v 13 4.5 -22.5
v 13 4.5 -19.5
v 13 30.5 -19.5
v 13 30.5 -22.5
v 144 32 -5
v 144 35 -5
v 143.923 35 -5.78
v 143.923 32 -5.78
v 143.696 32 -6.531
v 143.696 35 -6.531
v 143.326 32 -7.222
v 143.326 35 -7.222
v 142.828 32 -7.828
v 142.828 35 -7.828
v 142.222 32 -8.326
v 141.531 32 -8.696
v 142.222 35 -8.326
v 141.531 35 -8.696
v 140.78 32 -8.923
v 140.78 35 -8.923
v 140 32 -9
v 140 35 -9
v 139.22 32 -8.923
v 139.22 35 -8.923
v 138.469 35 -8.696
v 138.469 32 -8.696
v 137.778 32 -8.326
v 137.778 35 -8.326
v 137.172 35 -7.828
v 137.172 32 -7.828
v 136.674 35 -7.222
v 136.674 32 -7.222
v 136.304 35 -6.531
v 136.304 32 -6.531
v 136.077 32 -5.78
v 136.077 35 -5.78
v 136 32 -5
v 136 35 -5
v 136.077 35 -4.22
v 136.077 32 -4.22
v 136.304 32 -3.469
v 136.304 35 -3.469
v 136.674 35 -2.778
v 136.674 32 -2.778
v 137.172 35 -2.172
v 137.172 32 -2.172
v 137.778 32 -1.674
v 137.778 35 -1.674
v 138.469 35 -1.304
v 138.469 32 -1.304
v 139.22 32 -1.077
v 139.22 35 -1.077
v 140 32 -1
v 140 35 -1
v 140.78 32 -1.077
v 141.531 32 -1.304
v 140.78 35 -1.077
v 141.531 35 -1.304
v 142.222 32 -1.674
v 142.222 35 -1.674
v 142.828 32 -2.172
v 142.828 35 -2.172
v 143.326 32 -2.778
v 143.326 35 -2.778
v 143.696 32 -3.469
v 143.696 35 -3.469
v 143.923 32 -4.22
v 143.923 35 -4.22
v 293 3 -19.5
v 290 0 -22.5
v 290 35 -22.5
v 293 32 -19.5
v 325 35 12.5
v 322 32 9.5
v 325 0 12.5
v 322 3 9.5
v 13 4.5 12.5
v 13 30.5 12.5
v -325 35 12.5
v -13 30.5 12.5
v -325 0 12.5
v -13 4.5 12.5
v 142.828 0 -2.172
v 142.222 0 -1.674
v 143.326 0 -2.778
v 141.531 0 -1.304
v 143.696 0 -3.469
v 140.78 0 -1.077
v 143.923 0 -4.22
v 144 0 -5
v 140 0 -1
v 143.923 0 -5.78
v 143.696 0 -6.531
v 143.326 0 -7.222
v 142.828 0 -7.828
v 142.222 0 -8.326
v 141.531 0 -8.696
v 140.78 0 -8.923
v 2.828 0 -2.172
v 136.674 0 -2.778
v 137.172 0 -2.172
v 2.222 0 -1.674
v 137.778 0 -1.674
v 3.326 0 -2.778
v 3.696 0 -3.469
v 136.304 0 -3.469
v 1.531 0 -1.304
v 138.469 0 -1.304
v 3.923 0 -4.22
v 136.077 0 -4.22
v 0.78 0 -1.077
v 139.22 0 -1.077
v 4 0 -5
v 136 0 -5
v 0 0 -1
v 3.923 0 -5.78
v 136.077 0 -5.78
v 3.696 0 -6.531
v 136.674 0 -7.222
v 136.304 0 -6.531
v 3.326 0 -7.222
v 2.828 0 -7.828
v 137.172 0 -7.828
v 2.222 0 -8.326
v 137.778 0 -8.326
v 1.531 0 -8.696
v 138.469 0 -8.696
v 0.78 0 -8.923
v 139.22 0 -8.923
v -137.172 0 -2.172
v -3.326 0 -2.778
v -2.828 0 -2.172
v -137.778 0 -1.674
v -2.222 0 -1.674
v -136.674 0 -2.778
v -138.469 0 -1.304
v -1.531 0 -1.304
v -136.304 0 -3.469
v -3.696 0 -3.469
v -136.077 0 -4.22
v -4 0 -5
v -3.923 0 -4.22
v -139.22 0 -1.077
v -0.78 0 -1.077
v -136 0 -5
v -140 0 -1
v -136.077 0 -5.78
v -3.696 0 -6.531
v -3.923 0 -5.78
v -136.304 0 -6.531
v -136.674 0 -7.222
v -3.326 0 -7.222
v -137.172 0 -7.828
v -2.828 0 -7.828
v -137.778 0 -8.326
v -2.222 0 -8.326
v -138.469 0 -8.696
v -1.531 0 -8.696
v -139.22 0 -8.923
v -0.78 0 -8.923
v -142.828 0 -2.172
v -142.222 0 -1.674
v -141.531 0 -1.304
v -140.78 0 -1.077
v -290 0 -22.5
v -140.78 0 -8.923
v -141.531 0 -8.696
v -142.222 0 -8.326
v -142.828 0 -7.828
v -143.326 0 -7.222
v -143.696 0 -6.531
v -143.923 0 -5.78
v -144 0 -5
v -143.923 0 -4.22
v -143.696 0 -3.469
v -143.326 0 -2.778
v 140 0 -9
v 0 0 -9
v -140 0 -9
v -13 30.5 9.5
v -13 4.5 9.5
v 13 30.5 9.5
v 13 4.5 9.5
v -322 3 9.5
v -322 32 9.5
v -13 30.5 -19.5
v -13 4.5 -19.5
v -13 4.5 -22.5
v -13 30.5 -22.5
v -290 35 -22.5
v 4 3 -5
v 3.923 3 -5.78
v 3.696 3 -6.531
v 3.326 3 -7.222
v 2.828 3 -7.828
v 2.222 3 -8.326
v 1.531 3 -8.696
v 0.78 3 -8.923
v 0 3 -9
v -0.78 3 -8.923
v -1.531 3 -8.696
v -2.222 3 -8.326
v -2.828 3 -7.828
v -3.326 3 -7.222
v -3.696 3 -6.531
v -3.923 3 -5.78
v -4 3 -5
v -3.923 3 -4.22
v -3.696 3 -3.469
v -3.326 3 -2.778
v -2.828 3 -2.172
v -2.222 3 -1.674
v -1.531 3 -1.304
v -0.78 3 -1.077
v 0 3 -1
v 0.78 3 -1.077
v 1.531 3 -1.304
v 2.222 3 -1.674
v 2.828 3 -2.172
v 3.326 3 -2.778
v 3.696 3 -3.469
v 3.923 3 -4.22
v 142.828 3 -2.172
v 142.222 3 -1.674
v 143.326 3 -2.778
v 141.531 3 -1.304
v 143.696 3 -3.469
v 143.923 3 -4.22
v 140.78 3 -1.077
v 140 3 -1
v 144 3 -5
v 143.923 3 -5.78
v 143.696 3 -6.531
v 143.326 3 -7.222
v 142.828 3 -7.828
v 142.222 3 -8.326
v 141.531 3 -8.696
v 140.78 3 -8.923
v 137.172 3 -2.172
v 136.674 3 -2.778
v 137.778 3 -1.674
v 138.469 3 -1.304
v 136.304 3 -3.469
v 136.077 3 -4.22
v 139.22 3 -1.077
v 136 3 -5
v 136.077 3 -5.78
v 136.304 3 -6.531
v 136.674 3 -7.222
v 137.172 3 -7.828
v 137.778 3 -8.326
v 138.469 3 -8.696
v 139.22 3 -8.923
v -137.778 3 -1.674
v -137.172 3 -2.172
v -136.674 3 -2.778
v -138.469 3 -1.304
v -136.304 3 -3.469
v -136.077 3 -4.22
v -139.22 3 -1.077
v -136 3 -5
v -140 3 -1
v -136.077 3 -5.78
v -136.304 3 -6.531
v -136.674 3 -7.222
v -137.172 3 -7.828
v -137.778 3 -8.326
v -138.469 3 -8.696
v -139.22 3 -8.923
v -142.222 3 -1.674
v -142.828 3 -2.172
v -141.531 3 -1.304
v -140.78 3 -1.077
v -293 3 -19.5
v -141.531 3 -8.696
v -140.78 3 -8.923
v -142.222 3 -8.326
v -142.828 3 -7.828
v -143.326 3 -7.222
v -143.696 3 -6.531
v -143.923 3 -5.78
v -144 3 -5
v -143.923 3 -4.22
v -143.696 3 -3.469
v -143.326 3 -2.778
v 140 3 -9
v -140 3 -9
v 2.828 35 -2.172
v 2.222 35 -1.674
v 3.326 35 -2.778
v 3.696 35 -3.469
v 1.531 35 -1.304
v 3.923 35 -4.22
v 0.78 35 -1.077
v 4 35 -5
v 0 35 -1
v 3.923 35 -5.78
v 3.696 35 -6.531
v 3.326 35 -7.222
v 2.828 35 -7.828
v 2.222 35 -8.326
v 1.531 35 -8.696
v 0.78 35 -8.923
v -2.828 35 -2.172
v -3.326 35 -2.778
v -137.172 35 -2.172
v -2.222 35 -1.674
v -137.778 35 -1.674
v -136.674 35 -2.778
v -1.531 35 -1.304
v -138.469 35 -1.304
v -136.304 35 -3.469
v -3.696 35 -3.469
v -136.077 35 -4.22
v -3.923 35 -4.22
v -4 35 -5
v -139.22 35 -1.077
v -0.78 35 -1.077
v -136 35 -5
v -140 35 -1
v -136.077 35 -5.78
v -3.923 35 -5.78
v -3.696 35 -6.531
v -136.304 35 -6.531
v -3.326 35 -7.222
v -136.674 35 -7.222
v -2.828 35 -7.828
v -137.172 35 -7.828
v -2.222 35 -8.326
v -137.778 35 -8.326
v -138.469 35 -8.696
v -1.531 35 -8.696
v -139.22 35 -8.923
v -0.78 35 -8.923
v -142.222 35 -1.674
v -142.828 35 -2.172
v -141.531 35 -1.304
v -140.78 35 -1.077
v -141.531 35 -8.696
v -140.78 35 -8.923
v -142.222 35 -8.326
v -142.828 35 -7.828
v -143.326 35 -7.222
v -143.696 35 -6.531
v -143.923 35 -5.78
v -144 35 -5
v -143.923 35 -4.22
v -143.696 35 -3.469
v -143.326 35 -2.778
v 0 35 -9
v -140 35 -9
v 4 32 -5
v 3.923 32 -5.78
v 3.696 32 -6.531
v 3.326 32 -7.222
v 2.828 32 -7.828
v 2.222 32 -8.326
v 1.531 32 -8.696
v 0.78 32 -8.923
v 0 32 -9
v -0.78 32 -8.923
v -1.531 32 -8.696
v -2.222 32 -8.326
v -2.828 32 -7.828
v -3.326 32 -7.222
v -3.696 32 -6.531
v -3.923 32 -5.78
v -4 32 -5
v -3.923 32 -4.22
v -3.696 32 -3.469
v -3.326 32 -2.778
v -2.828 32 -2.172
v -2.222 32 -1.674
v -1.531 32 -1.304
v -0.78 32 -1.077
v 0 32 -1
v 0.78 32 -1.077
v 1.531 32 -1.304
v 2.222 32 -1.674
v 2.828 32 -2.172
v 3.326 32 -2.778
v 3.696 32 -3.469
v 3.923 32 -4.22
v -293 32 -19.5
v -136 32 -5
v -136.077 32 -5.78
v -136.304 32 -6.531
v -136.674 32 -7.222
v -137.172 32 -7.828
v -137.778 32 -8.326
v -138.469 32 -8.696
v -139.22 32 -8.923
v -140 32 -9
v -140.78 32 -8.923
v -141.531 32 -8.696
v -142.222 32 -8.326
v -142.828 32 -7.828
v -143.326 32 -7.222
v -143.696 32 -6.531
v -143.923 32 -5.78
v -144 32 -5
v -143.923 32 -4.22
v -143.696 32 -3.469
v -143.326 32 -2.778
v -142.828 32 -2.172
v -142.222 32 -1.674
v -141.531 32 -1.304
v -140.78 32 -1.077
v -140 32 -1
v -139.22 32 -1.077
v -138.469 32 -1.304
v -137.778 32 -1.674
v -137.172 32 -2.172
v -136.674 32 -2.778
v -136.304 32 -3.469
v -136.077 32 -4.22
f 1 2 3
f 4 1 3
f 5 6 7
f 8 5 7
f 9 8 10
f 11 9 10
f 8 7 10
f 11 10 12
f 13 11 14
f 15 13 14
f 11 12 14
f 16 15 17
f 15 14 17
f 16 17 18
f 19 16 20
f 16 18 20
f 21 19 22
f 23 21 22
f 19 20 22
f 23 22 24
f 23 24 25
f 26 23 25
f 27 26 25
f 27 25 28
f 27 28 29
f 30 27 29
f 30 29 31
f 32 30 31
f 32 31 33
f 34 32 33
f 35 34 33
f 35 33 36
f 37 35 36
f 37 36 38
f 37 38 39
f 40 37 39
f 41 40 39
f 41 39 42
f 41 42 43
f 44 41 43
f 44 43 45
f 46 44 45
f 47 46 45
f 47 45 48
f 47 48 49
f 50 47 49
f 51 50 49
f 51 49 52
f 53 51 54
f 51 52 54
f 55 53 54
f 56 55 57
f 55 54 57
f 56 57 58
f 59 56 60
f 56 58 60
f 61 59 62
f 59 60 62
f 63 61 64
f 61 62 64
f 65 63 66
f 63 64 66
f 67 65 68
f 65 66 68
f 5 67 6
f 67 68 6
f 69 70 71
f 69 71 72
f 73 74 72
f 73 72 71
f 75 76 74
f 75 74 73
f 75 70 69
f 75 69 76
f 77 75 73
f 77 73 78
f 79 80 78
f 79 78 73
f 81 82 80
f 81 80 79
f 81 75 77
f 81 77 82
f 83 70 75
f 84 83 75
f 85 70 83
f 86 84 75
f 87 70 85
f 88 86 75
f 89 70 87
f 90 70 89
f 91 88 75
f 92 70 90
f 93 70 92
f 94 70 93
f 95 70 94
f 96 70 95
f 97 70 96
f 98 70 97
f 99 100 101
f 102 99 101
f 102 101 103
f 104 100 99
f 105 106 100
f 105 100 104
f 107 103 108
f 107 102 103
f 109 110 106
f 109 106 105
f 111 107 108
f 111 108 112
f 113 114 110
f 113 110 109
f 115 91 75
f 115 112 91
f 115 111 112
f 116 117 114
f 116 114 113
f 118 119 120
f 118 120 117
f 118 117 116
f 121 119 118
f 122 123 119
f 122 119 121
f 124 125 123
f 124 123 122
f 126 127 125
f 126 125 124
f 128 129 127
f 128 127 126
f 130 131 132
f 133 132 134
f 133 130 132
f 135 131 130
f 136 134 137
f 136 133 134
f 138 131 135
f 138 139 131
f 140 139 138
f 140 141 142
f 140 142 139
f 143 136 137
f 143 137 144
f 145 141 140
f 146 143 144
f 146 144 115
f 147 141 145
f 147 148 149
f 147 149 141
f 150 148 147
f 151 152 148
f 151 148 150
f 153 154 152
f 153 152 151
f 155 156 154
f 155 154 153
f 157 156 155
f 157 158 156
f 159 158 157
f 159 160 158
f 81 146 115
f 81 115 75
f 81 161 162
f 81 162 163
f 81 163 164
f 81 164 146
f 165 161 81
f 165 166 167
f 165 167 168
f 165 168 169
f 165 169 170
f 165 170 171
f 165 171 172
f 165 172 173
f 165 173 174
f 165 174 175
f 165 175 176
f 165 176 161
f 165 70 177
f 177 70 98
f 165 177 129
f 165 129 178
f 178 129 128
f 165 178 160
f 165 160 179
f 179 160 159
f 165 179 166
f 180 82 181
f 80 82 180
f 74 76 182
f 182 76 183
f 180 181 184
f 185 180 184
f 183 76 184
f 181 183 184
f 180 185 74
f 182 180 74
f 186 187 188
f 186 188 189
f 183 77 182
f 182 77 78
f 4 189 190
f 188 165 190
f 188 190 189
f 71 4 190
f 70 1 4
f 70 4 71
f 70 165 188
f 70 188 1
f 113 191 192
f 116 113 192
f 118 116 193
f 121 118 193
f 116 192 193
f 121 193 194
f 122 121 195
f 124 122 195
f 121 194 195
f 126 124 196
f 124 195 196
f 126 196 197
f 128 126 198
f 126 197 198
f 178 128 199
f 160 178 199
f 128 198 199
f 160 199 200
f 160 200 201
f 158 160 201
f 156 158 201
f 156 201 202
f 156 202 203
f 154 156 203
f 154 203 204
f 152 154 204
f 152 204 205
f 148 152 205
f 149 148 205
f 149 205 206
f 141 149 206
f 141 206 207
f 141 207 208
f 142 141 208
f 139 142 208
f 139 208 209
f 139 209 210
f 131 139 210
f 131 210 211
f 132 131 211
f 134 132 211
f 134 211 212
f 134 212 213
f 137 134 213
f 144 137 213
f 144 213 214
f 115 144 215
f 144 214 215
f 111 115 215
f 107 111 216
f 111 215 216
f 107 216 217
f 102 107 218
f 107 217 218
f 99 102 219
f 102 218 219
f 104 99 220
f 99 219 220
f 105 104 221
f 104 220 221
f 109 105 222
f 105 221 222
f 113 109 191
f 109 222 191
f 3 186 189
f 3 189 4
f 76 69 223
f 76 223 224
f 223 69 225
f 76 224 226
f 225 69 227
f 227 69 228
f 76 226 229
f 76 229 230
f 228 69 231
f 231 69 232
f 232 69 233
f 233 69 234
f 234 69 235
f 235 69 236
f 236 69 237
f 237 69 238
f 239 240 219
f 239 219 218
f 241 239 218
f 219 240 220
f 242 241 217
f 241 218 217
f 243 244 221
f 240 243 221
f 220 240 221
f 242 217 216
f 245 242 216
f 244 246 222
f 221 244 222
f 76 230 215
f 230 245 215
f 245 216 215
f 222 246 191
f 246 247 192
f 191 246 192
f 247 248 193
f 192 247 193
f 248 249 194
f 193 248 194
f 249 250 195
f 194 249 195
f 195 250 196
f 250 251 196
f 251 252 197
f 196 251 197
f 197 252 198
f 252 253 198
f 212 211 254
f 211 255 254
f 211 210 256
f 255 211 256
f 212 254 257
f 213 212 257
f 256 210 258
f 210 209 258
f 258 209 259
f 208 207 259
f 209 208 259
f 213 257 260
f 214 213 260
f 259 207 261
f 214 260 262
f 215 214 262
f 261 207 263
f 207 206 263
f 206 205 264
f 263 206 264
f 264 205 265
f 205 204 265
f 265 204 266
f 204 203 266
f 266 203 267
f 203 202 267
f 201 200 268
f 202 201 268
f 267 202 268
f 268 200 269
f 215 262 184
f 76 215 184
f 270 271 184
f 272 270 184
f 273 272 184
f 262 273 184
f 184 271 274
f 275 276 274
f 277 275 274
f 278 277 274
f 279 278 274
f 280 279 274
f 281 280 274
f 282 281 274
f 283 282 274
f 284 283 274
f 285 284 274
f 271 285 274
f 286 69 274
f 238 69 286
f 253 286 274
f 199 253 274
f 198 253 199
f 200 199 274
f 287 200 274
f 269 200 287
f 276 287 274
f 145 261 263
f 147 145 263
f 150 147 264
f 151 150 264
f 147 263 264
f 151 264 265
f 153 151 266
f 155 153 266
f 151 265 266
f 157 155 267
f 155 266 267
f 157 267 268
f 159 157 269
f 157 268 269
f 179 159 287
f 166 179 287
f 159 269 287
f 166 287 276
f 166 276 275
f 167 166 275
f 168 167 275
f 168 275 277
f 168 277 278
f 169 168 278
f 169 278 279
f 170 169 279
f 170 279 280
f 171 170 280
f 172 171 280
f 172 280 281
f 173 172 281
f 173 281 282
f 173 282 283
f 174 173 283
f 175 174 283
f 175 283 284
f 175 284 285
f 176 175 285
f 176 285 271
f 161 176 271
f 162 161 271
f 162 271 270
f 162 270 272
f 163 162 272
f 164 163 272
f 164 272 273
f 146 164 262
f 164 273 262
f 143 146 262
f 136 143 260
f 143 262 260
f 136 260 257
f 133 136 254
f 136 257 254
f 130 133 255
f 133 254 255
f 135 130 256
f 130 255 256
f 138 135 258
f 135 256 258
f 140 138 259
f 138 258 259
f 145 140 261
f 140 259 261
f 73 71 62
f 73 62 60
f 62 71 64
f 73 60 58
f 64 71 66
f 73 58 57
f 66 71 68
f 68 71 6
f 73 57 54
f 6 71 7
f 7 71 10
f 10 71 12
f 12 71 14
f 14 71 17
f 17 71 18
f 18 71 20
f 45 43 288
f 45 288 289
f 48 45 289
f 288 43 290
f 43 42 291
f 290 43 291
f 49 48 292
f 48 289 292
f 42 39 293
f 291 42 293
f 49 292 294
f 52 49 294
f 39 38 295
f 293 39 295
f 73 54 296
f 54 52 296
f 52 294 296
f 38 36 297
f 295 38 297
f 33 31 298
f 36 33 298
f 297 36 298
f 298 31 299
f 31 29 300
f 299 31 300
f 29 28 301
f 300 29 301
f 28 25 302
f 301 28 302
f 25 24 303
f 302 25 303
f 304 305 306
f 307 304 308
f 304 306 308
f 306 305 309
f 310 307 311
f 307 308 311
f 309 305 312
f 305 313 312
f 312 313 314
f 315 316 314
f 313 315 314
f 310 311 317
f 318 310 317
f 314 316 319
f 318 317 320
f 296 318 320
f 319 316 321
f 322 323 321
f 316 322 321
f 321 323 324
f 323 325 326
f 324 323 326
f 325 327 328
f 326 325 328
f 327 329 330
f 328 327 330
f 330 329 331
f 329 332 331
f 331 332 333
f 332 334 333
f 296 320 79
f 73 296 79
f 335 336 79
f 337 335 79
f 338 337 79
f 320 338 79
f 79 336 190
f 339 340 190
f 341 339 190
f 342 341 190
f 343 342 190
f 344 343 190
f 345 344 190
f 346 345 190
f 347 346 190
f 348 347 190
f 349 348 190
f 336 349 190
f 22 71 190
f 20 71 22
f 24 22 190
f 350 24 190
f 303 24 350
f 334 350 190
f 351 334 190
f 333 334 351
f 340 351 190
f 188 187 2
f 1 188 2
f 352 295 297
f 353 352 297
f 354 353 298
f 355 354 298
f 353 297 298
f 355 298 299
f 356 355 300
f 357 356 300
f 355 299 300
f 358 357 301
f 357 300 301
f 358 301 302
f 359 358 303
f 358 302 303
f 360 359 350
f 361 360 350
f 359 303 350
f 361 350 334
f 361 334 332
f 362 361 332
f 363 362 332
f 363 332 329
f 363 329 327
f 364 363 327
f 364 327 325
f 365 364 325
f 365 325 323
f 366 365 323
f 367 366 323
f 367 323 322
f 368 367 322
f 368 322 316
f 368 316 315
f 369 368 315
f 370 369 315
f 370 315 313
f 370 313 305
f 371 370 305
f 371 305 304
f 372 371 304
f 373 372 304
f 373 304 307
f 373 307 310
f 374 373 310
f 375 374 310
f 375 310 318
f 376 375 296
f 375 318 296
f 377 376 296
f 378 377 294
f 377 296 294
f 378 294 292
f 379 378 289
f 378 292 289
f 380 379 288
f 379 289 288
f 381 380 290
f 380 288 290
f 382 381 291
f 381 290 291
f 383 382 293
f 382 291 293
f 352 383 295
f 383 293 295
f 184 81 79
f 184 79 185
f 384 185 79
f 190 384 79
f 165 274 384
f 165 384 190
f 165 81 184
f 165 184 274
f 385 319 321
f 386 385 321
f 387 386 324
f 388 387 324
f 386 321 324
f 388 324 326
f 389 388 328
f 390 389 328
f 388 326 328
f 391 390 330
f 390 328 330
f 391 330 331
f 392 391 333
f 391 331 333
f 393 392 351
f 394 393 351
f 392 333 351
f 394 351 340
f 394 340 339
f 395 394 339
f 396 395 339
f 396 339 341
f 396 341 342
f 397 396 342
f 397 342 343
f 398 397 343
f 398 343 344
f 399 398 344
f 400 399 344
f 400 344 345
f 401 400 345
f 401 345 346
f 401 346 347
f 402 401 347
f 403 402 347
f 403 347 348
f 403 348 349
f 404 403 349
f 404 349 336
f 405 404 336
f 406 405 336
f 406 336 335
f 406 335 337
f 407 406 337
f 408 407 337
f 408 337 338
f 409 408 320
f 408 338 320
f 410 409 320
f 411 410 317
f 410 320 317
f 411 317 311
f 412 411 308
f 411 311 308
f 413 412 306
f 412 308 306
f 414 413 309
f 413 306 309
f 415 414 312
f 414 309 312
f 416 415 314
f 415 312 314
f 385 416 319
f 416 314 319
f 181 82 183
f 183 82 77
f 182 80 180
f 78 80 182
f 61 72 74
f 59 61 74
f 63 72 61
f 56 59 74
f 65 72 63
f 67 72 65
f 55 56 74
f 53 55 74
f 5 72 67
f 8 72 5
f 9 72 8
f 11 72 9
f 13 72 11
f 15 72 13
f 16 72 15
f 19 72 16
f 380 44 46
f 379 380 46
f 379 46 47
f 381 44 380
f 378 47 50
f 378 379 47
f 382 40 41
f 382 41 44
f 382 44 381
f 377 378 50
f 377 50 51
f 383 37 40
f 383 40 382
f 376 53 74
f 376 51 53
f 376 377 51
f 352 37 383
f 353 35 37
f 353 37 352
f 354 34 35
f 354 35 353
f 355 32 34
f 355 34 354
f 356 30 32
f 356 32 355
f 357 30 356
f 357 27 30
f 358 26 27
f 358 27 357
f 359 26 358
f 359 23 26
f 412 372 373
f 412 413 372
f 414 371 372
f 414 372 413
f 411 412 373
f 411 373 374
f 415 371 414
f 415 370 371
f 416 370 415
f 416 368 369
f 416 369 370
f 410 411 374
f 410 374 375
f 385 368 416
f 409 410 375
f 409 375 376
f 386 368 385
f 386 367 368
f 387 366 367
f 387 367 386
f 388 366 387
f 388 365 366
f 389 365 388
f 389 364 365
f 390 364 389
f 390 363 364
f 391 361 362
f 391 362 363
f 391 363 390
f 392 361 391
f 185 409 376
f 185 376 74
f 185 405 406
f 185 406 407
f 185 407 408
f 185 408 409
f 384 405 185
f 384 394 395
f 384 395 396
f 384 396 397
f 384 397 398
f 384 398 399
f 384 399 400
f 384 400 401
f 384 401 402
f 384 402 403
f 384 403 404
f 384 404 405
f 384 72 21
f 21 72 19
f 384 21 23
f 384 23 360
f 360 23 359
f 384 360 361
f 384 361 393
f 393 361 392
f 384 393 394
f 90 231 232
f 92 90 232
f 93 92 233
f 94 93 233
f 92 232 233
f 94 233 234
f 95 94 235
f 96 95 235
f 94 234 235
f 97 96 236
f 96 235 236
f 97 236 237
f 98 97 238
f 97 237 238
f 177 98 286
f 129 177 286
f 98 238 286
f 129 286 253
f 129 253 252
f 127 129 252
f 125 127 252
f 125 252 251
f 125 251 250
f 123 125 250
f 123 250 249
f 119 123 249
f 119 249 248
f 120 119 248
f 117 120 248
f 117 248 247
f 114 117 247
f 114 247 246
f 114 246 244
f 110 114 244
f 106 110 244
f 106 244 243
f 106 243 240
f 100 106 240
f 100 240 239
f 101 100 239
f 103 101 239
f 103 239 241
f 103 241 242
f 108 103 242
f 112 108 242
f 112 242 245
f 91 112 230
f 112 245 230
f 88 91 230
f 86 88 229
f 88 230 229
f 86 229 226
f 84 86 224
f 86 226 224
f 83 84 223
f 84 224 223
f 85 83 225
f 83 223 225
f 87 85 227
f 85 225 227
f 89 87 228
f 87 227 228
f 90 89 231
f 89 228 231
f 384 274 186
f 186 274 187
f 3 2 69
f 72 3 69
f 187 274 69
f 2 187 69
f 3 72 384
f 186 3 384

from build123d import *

# Parameters (mm, degrees)
BOSS_EXTRUDE1_DEPTH = 35
SHELL1_T            = -3
SKETCH2_W           = 26
SKETCH2_H           = 26
CUT_EXTRUDE1_DEPTH  = 36
SKETCH3_R           = 4
CUT_EXTRUDE2_DEPTH  = 36


with BuildPart() as part:
    # Sketch1 → Boss-Extrude1 (new body)
    with BuildSketch(Plane(origin=(0, 0, 0), x_dir=(1, 0, 0), z_dir=(0, 1, 0))):
        Polygon((-325, -12.5), (-290, 22.5), (290, 22.5), (325, -12.5), align=None)
    extrude(amount=BOSS_EXTRUDE1_DEPTH)

    # Shell1
    shell1_openings = [part.faces().sort_by_distance(p)[0] for p in [
        (-307.5, 17.5, -5),
        (307.5, 17.5, -5),
    ]]
    offset(amount=SHELL1_T, openings=shell1_openings, kind=Kind.INTERSECTION)

    # Sketch2 → Cut-Extrude1 (cut, through all)
    with BuildSketch(Plane.XY.offset(12.5)):
        with Locations((0, 17.5)):
            Rectangle(SKETCH2_W, SKETCH2_H)
    extrude(amount=-CUT_EXTRUDE1_DEPTH, mode=Mode.SUBTRACT)

    # Sketch3 → Cut-Extrude2 (cut, through all)
    with BuildSketch(Plane(origin=(0, 35, 0), x_dir=(1, 0, 0), z_dir=(0, 1, 0))):
        with Locations((0, 5)):
            Circle(SKETCH3_R)
        with Locations((140, 5)):
            Circle(SKETCH3_R)
        with Locations((-140, 5)):
            Circle(SKETCH3_R)
    extrude(amount=-CUT_EXTRUDE2_DEPTH, mode=Mode.SUBTRACT)


solid = part.part
